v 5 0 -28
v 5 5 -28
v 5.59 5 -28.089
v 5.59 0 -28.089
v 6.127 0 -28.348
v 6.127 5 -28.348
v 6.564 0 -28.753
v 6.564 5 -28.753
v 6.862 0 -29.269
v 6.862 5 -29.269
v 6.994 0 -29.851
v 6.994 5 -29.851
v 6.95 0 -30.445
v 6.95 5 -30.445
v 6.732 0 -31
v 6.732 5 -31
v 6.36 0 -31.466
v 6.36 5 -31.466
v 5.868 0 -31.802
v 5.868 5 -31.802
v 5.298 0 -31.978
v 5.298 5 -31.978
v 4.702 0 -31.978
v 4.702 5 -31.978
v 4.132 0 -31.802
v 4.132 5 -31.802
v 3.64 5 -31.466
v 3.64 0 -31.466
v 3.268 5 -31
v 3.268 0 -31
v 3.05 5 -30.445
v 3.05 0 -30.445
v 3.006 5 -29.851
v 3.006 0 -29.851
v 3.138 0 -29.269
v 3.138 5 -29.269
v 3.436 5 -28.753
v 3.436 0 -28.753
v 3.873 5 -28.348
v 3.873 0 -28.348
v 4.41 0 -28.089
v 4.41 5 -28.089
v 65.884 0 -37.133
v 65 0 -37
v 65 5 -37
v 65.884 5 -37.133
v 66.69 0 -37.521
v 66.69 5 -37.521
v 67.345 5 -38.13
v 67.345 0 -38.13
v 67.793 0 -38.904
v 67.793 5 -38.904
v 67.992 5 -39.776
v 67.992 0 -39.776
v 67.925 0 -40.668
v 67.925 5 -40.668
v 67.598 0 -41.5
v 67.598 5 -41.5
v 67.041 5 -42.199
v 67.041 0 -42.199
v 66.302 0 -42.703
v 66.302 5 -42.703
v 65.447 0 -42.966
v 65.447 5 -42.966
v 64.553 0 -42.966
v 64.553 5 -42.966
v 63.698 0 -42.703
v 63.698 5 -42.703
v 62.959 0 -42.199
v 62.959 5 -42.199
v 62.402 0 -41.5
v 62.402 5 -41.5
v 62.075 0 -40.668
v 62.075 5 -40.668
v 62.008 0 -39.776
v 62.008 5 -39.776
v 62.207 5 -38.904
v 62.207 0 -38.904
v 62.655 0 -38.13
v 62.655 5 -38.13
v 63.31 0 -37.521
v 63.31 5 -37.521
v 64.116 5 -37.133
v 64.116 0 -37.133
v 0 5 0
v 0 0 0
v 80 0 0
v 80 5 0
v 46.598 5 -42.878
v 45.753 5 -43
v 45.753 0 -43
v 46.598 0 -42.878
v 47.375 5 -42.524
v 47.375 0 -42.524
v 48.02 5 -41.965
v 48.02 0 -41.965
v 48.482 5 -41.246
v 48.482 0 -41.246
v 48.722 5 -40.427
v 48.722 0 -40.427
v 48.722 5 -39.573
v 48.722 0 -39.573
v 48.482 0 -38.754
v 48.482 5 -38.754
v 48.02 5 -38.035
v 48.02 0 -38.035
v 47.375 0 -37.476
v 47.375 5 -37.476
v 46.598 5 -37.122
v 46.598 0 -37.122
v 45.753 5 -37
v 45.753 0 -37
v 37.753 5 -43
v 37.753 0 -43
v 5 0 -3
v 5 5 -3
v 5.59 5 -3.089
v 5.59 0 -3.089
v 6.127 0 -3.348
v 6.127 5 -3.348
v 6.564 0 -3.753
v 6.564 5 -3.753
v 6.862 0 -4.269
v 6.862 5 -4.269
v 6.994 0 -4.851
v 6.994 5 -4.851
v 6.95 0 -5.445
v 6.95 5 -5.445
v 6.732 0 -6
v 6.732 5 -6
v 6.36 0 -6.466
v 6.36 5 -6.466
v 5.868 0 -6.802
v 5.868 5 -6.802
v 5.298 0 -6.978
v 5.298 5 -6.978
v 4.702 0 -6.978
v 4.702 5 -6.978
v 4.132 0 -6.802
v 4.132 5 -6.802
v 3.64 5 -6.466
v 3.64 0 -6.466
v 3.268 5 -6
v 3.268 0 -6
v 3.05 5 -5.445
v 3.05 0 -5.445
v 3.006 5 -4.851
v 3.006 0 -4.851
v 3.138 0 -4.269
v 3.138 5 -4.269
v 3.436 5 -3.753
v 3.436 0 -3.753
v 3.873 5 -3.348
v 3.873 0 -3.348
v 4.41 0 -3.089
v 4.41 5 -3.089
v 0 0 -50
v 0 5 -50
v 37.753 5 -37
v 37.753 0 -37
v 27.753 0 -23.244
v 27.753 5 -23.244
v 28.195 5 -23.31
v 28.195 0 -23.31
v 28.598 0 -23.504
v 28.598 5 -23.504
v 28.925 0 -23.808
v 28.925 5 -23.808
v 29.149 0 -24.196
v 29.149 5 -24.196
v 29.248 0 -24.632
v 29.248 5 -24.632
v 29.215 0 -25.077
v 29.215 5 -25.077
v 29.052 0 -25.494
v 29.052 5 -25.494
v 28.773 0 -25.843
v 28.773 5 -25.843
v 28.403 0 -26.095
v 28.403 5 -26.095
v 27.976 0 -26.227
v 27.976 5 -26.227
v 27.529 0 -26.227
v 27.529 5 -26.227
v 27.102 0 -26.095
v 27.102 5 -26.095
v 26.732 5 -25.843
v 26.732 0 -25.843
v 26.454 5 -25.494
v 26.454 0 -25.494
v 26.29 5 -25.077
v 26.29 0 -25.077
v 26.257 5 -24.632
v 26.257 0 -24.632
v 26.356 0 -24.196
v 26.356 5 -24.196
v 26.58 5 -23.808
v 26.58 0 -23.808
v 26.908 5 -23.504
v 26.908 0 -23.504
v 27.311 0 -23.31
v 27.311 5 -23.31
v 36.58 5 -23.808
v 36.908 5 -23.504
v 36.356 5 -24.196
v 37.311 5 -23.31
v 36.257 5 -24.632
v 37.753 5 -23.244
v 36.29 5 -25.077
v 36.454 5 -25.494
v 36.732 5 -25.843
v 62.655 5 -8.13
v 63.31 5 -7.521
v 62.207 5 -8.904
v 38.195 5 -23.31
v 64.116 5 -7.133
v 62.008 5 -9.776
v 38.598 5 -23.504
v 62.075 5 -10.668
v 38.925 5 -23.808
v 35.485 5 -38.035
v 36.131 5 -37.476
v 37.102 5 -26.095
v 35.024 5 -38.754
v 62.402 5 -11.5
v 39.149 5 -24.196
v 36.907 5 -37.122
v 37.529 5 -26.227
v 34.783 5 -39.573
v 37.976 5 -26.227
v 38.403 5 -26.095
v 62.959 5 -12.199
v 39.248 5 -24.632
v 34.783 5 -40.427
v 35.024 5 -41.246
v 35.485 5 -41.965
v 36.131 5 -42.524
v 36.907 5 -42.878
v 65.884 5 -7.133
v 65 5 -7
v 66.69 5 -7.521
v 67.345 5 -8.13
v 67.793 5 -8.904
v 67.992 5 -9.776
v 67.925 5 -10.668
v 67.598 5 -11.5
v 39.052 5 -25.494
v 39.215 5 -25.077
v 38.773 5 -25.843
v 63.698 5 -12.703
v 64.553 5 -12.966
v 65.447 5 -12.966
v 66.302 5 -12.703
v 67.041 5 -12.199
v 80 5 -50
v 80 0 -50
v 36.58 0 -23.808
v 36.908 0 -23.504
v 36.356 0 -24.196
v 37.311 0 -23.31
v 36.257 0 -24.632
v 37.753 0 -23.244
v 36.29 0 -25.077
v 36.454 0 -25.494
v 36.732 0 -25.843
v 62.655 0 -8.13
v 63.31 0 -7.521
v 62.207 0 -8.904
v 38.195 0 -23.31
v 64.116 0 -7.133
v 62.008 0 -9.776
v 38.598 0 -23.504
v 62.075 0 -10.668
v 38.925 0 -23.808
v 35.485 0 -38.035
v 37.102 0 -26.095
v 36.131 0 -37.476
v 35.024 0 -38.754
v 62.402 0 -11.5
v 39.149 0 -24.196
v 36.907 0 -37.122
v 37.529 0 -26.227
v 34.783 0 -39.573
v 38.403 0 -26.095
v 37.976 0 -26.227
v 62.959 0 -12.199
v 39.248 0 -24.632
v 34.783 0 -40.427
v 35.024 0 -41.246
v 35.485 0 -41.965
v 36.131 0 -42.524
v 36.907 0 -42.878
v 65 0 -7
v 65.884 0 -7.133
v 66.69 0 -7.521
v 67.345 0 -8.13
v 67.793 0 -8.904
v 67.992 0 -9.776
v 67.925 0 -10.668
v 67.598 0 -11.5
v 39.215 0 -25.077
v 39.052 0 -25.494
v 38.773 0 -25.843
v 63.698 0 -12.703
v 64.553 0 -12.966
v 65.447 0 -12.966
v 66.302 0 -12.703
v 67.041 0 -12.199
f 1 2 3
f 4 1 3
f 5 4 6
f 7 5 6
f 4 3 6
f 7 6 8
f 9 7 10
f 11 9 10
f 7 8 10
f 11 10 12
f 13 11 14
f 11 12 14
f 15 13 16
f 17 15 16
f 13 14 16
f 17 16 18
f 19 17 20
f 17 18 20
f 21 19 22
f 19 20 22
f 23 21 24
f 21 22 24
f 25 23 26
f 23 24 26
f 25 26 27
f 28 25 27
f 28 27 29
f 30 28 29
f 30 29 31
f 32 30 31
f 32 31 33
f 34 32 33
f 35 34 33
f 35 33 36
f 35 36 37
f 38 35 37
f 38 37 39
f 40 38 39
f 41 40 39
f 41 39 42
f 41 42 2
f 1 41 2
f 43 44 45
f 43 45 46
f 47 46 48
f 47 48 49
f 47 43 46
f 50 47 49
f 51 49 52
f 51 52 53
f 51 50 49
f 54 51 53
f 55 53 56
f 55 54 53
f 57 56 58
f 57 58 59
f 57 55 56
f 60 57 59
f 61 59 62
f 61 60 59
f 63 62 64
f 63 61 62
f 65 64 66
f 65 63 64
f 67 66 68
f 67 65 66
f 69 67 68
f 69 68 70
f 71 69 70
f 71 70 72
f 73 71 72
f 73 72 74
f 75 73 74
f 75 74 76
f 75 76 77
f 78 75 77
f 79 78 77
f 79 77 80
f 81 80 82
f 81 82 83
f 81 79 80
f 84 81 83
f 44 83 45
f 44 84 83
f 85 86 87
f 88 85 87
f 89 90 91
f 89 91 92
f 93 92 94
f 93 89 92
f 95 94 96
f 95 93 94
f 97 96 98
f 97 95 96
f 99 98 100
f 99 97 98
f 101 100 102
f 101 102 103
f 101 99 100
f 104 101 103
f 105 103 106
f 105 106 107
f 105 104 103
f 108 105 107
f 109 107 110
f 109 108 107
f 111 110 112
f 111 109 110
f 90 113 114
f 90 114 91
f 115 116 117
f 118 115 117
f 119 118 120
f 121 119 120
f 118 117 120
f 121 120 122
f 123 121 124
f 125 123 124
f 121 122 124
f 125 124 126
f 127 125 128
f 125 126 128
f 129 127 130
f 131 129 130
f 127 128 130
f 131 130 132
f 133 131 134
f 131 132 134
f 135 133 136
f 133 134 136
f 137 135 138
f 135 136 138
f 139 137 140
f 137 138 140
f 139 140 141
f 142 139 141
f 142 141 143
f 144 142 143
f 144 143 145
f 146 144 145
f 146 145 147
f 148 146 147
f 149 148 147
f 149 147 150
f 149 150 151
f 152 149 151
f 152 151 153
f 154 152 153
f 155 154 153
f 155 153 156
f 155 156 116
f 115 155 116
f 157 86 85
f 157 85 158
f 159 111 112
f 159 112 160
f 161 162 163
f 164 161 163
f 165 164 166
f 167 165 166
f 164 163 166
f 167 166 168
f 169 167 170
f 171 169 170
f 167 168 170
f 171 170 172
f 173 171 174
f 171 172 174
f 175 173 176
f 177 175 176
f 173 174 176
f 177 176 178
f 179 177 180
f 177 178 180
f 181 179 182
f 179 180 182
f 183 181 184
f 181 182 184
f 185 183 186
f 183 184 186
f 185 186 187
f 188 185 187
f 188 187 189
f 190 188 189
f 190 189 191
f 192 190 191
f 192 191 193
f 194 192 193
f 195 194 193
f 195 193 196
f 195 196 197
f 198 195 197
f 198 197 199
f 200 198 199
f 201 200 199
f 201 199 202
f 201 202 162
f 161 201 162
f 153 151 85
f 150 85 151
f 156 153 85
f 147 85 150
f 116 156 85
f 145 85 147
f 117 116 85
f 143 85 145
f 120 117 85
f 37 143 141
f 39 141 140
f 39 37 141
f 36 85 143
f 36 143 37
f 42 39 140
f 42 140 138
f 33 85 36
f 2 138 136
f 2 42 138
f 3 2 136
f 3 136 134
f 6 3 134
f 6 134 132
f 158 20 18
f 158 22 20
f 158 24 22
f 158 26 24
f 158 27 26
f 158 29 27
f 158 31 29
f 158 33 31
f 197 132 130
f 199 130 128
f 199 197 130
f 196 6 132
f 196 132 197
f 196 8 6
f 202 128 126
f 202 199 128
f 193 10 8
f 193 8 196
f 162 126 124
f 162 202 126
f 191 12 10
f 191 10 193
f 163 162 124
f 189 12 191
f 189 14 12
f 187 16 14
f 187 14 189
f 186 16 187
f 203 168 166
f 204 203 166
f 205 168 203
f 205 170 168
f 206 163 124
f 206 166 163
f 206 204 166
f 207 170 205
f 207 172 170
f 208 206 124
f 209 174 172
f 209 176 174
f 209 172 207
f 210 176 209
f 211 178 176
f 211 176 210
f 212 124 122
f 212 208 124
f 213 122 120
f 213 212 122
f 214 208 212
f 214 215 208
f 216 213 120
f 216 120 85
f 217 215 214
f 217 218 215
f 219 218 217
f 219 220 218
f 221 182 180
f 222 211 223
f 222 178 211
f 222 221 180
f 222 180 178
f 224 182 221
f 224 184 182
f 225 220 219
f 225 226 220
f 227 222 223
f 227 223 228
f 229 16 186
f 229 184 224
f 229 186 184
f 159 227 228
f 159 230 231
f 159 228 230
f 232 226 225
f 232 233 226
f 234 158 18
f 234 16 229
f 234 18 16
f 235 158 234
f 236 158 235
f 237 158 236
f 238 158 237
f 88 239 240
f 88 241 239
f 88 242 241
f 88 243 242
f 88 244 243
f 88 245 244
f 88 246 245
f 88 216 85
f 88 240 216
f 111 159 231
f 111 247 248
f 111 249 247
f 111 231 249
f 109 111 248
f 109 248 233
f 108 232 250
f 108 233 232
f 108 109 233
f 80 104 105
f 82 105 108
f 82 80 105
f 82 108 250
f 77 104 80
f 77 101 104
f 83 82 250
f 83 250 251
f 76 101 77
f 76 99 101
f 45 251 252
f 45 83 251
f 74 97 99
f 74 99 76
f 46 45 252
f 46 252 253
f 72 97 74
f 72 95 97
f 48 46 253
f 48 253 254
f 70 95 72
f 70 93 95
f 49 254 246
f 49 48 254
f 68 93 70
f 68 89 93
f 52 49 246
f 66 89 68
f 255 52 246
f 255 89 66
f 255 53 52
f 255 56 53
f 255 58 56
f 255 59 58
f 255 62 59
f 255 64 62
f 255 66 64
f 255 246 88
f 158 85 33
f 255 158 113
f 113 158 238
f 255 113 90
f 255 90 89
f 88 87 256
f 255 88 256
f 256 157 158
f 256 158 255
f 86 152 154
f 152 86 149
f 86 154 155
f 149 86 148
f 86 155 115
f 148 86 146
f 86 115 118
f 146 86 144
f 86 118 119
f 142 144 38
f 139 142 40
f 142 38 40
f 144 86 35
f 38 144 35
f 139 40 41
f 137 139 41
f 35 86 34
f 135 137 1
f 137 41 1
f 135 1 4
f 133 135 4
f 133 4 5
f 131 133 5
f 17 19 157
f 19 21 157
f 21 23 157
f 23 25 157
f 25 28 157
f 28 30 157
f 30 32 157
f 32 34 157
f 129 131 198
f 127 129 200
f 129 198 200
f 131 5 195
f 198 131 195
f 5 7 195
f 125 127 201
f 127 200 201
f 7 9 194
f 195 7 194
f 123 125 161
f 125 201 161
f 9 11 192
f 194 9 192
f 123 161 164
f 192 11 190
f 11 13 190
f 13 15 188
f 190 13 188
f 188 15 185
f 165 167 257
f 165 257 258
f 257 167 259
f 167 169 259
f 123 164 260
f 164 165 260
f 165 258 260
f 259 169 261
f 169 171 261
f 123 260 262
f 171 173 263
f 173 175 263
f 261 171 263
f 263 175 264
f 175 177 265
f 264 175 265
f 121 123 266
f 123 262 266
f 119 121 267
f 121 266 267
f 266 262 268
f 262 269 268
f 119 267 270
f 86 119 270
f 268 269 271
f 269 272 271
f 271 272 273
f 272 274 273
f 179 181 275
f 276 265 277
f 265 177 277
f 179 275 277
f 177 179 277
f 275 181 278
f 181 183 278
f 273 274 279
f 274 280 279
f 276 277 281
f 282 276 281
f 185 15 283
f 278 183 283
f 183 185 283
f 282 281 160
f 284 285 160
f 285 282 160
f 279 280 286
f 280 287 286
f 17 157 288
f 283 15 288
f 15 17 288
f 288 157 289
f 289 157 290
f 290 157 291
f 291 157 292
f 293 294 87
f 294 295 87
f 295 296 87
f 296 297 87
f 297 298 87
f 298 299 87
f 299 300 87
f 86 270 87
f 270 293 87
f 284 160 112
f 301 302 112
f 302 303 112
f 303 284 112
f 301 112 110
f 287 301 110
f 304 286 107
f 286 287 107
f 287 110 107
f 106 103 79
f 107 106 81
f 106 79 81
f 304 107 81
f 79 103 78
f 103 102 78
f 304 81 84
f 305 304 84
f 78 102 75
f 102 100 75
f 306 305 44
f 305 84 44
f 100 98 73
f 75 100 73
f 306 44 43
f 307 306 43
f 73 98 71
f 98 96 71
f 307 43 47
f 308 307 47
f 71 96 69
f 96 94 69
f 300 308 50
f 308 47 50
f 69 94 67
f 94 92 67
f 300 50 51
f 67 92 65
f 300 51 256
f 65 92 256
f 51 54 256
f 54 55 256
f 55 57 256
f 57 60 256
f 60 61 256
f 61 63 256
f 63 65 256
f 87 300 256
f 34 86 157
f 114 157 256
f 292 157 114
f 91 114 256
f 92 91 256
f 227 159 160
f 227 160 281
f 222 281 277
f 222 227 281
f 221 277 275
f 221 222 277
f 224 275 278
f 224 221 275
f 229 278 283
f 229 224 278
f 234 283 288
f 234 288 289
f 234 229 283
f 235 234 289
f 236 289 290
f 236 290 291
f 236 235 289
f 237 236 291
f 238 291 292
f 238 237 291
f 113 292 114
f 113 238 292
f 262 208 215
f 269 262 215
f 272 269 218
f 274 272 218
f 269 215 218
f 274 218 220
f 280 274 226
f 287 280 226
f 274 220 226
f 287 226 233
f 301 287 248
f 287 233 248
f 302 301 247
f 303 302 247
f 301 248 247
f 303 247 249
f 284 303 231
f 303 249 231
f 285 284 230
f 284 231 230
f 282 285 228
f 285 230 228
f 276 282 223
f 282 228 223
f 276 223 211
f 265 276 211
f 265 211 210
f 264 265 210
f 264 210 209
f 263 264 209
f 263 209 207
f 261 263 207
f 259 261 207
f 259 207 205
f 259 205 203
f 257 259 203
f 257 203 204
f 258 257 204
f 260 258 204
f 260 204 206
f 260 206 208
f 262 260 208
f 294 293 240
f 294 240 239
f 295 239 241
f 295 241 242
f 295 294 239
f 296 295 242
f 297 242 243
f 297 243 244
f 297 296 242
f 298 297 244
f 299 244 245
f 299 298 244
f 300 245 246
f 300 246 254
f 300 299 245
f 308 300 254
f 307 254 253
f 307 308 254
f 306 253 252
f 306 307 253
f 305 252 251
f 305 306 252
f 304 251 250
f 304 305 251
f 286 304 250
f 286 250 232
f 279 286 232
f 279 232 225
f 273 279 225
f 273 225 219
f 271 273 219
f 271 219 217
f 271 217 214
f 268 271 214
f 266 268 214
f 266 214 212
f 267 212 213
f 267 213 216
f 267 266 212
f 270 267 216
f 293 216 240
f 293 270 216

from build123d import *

# Parameters (mm, degrees)
SKETCH1_W           = 80
SKETCH1_H           = 50
SKETCH1_R           = 3
BOSS_EXTRUDE1_DEPTH = 5
CUT_EXTRUDE1_DEPTH  = 5
SKETCH4_R           = 1.5
SKETCH4_R_2         = 2
CUT_EXTRUDE2_DEPTH  = 10


with BuildPart() as part:
    # Sketch1 → Boss-Extrude1 (new body)
    with BuildSketch(Plane(origin=(0, 0, 0), x_dir=(1, 0, 0), z_dir=(0, 1, 0))):
        with Locations((40, 25)):
            Rectangle(SKETCH1_W, SKETCH1_H)
        with Locations(Location((65, 10, 0), (0, 0, 270))):
            Circle(SKETCH1_R, mode=Mode.SUBTRACT)
        with Locations(Location((65, 40, 0), (0, 0, 270))):
            Circle(SKETCH1_R, mode=Mode.SUBTRACT)
    extrude(amount=BOSS_EXTRUDE1_DEPTH)

    # Sketch2 → Cut-Extrude1 (cut)
    with BuildSketch(Plane(origin=(0, 5, 0), x_dir=(1, 0, 0), z_dir=(0, 1, 0))):
        with BuildLine():
            Line((37.752664082, 43), (45.752664082, 43))
            ThreePointArc((45.752664082, 43), (48.752664082, 40), (45.752664082, 37))
            Line((45.752664082, 37), (37.752664082, 37))
            ThreePointArc((37.752664082, 37), (34.752664082, 40), (37.752664082, 43))
        make_face()
    extrude(amount=-CUT_EXTRUDE1_DEPTH, mode=Mode.SUBTRACT)

    # Sketch4 → Cut-Extrude2 (cut)
    with BuildSketch(Plane(origin=(0, 5, 0), x_dir=(1, 0, 0), z_dir=(0, 1, 0))):
        with Locations(Location((37.752664082, 24.743683398, 0), (0, 0, 270))):
            Circle(SKETCH4_R)
        with Locations(Location((27.752664082, 24.743683398, 0), (0, 0, 270))):
            Circle(SKETCH4_R)
        with Locations(Location((5, 30, 0), (0, 0, 270))):
            Circle(SKETCH4_R_2)
        with Locations(Location((5, 5, 0), (0, 0, 270))):
            Circle(SKETCH4_R_2)
    extrude(amount=-CUT_EXTRUDE2_DEPTH, mode=Mode.SUBTRACT)


solid = part.part
